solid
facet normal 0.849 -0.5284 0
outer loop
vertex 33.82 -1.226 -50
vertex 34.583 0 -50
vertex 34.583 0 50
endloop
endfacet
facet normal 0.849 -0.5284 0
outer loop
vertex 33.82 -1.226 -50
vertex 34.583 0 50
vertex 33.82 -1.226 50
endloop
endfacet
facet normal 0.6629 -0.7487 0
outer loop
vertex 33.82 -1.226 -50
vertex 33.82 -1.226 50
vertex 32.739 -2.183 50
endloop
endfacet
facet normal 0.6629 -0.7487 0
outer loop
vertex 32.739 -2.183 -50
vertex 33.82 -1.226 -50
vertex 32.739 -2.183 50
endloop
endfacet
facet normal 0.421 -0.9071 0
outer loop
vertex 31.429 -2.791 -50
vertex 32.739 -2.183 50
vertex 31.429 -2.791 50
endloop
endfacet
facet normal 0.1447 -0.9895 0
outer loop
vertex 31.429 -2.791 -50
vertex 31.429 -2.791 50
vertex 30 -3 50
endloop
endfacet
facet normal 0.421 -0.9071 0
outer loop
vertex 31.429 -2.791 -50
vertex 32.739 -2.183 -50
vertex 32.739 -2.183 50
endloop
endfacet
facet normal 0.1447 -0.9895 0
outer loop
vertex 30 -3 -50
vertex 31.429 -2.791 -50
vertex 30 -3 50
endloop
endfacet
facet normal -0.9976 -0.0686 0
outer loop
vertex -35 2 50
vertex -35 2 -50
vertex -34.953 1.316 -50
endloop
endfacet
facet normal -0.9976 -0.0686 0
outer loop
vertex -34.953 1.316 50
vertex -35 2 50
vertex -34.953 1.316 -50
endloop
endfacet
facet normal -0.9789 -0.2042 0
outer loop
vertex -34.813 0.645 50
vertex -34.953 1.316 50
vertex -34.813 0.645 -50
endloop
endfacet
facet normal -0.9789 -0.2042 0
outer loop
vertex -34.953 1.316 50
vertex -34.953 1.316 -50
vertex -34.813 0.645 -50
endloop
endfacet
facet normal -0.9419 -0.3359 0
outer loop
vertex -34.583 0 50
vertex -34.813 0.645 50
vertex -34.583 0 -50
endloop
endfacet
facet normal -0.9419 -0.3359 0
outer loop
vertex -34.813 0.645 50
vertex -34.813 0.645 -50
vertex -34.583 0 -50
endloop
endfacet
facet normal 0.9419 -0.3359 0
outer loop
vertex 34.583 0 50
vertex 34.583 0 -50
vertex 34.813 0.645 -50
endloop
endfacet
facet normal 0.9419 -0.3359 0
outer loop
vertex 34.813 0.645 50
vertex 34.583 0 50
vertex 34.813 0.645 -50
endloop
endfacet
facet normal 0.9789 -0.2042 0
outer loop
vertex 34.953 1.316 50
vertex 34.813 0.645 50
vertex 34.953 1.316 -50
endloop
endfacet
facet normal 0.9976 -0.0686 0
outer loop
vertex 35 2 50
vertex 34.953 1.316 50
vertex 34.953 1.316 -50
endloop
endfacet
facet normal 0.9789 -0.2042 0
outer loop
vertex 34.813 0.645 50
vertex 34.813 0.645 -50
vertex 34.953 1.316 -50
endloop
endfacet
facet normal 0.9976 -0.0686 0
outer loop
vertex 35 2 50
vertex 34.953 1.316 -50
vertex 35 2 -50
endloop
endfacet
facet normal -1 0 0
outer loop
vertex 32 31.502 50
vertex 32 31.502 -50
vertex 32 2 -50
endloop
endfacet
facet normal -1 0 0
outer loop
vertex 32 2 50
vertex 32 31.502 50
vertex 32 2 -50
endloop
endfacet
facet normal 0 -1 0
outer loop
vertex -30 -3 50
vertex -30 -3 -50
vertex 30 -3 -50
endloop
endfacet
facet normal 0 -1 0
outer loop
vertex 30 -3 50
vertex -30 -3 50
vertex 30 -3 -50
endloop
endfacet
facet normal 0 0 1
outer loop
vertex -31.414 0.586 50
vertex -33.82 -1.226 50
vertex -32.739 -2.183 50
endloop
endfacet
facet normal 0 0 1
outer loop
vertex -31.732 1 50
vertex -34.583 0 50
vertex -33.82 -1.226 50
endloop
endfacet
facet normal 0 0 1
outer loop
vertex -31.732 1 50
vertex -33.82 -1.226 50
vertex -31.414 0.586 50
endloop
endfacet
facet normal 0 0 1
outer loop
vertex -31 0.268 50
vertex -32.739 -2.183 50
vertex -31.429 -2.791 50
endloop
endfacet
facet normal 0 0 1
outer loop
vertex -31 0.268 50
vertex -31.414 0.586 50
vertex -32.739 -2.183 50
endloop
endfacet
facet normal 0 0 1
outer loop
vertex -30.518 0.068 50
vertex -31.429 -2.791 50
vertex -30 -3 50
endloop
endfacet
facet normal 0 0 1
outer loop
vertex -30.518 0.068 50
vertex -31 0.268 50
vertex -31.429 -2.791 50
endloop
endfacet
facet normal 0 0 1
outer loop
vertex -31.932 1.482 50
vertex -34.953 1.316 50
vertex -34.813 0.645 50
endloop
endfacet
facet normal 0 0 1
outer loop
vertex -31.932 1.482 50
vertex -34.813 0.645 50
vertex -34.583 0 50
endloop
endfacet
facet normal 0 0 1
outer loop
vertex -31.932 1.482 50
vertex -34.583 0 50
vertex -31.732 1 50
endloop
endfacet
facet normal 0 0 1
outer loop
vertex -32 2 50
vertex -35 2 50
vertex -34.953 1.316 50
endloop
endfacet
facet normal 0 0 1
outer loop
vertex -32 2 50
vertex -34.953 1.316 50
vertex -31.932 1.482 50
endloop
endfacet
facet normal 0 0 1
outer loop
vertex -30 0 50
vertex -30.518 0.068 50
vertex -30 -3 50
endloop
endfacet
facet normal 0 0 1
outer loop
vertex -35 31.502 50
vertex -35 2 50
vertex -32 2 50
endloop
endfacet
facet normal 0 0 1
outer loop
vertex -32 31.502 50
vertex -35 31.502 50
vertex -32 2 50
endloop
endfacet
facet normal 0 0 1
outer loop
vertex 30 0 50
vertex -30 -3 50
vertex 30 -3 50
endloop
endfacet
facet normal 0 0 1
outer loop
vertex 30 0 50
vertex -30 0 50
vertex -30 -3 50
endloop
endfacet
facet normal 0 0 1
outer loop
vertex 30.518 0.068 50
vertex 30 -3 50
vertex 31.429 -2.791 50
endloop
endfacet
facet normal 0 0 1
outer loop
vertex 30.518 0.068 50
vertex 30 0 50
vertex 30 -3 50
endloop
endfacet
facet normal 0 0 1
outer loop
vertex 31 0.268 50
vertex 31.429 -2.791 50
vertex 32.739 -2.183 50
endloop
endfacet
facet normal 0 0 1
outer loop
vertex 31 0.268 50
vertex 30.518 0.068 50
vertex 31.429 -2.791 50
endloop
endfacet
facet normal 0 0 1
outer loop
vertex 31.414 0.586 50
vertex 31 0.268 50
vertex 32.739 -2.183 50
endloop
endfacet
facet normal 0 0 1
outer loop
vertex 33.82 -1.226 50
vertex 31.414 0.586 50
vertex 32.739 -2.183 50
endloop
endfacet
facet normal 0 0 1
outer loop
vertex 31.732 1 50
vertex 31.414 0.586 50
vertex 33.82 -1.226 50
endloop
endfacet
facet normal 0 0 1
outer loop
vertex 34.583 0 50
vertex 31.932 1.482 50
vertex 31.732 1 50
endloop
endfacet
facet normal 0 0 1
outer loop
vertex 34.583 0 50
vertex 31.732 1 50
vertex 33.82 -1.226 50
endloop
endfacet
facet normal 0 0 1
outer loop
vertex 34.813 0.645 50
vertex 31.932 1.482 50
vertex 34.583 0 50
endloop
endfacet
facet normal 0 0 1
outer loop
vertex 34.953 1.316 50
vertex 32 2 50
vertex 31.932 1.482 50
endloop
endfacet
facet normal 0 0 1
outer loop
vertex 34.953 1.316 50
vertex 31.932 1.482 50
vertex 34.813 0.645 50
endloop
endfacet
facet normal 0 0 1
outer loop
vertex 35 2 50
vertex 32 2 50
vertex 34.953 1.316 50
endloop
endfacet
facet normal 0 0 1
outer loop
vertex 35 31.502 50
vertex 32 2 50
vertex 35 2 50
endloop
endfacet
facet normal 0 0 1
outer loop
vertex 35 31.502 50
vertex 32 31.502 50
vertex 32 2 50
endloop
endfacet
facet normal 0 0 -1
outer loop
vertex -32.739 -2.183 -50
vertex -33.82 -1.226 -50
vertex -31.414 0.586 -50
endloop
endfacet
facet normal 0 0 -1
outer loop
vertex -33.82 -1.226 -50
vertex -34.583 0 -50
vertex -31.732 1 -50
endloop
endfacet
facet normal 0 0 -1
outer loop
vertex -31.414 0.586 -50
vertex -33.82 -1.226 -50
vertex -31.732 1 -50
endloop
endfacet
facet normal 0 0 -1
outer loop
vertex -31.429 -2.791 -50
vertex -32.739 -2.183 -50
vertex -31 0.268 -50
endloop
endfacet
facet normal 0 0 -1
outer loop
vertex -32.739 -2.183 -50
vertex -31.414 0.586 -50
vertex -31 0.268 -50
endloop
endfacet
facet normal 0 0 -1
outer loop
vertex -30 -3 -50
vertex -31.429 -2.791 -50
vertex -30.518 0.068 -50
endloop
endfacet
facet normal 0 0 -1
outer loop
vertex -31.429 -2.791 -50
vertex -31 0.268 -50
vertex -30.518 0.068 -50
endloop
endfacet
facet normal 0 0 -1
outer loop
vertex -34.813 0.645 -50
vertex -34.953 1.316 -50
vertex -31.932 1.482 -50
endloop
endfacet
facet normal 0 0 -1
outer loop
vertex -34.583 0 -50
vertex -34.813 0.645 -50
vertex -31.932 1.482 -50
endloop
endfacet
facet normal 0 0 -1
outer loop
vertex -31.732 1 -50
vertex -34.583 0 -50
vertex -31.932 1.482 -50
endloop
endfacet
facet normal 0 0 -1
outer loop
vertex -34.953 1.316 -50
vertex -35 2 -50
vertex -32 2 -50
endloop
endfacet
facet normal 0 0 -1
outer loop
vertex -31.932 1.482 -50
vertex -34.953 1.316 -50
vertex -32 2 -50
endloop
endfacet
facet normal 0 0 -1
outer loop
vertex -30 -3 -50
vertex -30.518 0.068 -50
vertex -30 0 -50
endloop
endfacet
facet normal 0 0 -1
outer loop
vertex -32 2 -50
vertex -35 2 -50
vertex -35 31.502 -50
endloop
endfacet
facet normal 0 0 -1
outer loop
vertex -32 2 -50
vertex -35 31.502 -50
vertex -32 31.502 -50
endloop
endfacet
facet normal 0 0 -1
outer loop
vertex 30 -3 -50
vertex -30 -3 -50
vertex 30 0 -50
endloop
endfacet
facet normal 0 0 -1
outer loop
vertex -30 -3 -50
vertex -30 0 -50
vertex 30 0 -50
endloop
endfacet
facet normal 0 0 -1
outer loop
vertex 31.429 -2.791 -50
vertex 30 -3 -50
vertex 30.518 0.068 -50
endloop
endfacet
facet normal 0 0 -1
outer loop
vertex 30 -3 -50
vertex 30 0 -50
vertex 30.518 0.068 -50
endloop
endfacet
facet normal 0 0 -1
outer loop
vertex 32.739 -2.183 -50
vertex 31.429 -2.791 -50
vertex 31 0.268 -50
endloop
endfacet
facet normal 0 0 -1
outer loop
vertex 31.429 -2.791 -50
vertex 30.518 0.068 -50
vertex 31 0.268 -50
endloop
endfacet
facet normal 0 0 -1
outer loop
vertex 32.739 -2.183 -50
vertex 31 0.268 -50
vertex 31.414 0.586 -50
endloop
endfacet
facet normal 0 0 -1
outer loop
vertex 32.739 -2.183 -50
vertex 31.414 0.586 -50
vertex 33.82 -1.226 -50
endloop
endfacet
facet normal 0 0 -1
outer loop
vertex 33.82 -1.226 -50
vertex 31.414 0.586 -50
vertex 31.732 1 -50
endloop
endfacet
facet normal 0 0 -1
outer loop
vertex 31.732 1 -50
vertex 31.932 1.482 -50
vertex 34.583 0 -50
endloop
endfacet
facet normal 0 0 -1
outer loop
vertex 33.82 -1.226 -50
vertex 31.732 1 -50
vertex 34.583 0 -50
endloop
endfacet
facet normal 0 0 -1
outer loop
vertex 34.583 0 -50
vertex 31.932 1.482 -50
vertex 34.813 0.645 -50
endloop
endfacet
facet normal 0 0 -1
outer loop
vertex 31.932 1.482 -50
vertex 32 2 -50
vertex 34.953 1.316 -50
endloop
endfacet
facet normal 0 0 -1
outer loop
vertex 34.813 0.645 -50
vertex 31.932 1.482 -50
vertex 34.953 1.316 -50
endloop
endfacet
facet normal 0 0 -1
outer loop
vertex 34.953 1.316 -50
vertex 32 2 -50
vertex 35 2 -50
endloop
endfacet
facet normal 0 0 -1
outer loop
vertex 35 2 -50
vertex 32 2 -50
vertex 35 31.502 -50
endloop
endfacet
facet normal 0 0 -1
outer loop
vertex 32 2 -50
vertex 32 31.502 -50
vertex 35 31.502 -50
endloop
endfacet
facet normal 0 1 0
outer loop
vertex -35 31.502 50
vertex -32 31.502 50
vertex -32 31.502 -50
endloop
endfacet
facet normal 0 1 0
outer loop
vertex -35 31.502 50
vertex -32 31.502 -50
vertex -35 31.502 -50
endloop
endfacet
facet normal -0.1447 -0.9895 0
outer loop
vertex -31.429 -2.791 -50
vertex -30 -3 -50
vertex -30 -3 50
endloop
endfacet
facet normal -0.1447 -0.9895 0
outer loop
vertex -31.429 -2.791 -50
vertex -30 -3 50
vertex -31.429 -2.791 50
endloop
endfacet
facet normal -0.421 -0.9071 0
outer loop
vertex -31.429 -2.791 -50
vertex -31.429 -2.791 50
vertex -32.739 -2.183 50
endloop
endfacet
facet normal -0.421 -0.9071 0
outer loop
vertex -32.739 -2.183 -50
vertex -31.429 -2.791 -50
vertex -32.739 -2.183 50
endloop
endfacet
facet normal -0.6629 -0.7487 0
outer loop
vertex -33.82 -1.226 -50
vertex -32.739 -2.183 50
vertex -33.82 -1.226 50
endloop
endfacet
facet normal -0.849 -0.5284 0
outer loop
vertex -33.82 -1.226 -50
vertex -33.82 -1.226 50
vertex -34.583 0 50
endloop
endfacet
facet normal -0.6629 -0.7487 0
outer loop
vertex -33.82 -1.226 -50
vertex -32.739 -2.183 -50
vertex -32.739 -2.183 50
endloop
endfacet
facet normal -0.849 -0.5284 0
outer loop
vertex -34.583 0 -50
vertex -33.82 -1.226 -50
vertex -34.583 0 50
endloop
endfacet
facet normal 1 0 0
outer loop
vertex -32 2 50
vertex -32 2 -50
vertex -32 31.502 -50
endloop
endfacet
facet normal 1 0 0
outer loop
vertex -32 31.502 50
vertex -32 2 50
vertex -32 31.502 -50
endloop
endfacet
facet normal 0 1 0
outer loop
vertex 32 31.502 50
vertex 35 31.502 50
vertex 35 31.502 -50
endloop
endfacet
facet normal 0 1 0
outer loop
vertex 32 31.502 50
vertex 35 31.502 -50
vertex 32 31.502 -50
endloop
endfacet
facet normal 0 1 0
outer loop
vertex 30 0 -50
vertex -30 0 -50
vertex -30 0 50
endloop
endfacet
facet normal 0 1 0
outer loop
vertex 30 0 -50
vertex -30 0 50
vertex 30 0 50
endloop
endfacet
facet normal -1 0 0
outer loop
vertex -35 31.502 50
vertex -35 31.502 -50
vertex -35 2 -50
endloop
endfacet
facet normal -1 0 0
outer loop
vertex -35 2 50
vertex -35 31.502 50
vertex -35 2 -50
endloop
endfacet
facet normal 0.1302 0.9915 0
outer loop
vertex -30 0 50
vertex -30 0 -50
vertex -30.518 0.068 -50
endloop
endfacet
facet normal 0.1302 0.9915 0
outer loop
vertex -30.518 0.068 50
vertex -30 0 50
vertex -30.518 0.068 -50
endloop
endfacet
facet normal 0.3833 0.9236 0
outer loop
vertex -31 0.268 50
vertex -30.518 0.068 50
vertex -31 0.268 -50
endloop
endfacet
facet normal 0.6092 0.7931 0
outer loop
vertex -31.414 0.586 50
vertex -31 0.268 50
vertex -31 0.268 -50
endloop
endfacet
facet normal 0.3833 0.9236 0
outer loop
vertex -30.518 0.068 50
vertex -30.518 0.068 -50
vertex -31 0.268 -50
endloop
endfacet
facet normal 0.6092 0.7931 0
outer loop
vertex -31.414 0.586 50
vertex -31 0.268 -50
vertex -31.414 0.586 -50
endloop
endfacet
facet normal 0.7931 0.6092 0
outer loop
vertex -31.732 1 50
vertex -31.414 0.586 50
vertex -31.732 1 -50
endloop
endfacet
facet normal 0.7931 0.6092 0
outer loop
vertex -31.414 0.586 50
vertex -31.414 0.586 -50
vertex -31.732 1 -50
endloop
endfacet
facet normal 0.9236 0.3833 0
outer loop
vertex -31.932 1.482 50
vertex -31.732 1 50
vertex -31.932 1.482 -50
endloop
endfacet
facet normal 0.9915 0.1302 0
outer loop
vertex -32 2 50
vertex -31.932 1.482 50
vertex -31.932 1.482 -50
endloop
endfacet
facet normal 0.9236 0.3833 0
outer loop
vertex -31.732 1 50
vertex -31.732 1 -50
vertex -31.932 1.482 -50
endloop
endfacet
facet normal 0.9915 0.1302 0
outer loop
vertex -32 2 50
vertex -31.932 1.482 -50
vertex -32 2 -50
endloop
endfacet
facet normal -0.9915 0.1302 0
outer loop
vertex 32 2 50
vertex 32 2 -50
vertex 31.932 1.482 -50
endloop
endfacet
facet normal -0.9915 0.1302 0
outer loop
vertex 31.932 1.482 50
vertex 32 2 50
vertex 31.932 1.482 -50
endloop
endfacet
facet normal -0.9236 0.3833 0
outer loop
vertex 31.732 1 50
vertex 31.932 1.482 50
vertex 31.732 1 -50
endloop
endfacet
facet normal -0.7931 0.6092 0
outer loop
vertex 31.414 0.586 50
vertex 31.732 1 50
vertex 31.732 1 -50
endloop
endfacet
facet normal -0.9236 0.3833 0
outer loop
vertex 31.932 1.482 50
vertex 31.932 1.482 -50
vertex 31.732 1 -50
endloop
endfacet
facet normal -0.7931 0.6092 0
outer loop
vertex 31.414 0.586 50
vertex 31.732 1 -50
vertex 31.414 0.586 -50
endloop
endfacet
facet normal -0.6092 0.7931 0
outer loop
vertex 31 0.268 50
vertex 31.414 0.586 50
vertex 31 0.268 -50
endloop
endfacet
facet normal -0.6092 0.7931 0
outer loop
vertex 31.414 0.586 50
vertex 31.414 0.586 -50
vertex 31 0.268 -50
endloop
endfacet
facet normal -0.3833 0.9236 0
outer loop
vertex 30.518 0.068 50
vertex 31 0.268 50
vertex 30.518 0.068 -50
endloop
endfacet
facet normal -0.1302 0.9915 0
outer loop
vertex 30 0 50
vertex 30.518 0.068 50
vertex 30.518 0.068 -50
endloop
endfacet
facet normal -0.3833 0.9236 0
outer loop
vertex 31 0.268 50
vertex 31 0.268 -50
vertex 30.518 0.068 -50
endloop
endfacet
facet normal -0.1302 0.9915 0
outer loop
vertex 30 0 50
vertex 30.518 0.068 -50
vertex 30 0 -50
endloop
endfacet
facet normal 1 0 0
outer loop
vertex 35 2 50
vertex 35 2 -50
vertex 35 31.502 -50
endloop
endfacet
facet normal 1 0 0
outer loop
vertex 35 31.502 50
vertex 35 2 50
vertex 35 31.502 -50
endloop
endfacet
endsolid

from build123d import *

# Parameters (mm, degrees)
SKETCH1_W              = 130
SKETCH1_H              = 100
BASE_FLANGE1_DEPTH     = 3
SKETCHED_START         = -50
SKETCHED_BEND1_DEPTH   = 100
SKETCHED_BEND1_2_DEPTH = 100


# Read off the part's stored shape, not the designer's step: Sketched Bend1
# Sheet-metal steps are written as plain solids
with BuildPart() as part:
    # Sketch1 → Base-Flange1 (new body)
    with BuildSketch(Plane(origin=(0, 0, 0), x_dir=(1, 0, 0), z_dir=(0, 1, 0))):
        Rectangle(SKETCH1_W, SKETCH1_H)
    extrude(amount=-BASE_FLANGE1_DEPTH)

    # Sketched Bend1 outline → Sketched Bend1 (cut)
    with BuildSketch(Plane.XY.offset(SKETCHED_START)):
        with BuildLine():
            Line((-65, -3), (-30, -3))
            ThreePointArc((-30, -3), (-32.738612788, -2.183300133), (-34.582575695, 0))
            Line((-34.582575695, 0), (-65, 0))
            Line((-65, 0), (-65, -3))
        make_face()
        with BuildLine():
            ThreePointArc((34.582575695, 0), (32.738612788, -2.183300133), (30, -3))
            Line((30, -3), (65, -3))
            Line((65, -3), (65, 0))
            Line((65, 0), (34.582575695, 0))
        make_face()
    extrude(amount=SKETCHED_BEND1_DEPTH, mode=Mode.SUBTRACT)

    # Sketched Bend1 2 outline → Sketched Bend1 2 (add)
    with BuildSketch(Plane.XY.offset(SKETCHED_START)):
        with BuildLine():
            ThreePointArc((-35, 2), (-34.894531565, 0.978451782), (-34.582575695, 0))
            Line((-34.582575695, 0), (-30, 0))
            ThreePointArc((-30, 0), (-31.414213562, 0.585786438), (-32, 2))
            Line((-32, 2), (-32, 31.502212856))
            Line((-32, 31.502212856), (-35, 31.502212856))
            Line((-35, 31.502212856), (-35, 2))
        make_face()
        with BuildLine():
            Line((30, 0), (34.582575695, 0))
            ThreePointArc((34.582575695, 0), (34.894531565, 0.978451782), (35, 2))
            Line((35, 2), (35, 31.502212856))
            Line((35, 31.502212856), (32, 31.502212856))
            Line((32, 31.502212856), (32, 2))
            ThreePointArc((32, 2), (31.414213562, 0.585786438), (30, 0))
        make_face()
    extrude(amount=SKETCHED_BEND1_2_DEPTH)


solid = part.part
